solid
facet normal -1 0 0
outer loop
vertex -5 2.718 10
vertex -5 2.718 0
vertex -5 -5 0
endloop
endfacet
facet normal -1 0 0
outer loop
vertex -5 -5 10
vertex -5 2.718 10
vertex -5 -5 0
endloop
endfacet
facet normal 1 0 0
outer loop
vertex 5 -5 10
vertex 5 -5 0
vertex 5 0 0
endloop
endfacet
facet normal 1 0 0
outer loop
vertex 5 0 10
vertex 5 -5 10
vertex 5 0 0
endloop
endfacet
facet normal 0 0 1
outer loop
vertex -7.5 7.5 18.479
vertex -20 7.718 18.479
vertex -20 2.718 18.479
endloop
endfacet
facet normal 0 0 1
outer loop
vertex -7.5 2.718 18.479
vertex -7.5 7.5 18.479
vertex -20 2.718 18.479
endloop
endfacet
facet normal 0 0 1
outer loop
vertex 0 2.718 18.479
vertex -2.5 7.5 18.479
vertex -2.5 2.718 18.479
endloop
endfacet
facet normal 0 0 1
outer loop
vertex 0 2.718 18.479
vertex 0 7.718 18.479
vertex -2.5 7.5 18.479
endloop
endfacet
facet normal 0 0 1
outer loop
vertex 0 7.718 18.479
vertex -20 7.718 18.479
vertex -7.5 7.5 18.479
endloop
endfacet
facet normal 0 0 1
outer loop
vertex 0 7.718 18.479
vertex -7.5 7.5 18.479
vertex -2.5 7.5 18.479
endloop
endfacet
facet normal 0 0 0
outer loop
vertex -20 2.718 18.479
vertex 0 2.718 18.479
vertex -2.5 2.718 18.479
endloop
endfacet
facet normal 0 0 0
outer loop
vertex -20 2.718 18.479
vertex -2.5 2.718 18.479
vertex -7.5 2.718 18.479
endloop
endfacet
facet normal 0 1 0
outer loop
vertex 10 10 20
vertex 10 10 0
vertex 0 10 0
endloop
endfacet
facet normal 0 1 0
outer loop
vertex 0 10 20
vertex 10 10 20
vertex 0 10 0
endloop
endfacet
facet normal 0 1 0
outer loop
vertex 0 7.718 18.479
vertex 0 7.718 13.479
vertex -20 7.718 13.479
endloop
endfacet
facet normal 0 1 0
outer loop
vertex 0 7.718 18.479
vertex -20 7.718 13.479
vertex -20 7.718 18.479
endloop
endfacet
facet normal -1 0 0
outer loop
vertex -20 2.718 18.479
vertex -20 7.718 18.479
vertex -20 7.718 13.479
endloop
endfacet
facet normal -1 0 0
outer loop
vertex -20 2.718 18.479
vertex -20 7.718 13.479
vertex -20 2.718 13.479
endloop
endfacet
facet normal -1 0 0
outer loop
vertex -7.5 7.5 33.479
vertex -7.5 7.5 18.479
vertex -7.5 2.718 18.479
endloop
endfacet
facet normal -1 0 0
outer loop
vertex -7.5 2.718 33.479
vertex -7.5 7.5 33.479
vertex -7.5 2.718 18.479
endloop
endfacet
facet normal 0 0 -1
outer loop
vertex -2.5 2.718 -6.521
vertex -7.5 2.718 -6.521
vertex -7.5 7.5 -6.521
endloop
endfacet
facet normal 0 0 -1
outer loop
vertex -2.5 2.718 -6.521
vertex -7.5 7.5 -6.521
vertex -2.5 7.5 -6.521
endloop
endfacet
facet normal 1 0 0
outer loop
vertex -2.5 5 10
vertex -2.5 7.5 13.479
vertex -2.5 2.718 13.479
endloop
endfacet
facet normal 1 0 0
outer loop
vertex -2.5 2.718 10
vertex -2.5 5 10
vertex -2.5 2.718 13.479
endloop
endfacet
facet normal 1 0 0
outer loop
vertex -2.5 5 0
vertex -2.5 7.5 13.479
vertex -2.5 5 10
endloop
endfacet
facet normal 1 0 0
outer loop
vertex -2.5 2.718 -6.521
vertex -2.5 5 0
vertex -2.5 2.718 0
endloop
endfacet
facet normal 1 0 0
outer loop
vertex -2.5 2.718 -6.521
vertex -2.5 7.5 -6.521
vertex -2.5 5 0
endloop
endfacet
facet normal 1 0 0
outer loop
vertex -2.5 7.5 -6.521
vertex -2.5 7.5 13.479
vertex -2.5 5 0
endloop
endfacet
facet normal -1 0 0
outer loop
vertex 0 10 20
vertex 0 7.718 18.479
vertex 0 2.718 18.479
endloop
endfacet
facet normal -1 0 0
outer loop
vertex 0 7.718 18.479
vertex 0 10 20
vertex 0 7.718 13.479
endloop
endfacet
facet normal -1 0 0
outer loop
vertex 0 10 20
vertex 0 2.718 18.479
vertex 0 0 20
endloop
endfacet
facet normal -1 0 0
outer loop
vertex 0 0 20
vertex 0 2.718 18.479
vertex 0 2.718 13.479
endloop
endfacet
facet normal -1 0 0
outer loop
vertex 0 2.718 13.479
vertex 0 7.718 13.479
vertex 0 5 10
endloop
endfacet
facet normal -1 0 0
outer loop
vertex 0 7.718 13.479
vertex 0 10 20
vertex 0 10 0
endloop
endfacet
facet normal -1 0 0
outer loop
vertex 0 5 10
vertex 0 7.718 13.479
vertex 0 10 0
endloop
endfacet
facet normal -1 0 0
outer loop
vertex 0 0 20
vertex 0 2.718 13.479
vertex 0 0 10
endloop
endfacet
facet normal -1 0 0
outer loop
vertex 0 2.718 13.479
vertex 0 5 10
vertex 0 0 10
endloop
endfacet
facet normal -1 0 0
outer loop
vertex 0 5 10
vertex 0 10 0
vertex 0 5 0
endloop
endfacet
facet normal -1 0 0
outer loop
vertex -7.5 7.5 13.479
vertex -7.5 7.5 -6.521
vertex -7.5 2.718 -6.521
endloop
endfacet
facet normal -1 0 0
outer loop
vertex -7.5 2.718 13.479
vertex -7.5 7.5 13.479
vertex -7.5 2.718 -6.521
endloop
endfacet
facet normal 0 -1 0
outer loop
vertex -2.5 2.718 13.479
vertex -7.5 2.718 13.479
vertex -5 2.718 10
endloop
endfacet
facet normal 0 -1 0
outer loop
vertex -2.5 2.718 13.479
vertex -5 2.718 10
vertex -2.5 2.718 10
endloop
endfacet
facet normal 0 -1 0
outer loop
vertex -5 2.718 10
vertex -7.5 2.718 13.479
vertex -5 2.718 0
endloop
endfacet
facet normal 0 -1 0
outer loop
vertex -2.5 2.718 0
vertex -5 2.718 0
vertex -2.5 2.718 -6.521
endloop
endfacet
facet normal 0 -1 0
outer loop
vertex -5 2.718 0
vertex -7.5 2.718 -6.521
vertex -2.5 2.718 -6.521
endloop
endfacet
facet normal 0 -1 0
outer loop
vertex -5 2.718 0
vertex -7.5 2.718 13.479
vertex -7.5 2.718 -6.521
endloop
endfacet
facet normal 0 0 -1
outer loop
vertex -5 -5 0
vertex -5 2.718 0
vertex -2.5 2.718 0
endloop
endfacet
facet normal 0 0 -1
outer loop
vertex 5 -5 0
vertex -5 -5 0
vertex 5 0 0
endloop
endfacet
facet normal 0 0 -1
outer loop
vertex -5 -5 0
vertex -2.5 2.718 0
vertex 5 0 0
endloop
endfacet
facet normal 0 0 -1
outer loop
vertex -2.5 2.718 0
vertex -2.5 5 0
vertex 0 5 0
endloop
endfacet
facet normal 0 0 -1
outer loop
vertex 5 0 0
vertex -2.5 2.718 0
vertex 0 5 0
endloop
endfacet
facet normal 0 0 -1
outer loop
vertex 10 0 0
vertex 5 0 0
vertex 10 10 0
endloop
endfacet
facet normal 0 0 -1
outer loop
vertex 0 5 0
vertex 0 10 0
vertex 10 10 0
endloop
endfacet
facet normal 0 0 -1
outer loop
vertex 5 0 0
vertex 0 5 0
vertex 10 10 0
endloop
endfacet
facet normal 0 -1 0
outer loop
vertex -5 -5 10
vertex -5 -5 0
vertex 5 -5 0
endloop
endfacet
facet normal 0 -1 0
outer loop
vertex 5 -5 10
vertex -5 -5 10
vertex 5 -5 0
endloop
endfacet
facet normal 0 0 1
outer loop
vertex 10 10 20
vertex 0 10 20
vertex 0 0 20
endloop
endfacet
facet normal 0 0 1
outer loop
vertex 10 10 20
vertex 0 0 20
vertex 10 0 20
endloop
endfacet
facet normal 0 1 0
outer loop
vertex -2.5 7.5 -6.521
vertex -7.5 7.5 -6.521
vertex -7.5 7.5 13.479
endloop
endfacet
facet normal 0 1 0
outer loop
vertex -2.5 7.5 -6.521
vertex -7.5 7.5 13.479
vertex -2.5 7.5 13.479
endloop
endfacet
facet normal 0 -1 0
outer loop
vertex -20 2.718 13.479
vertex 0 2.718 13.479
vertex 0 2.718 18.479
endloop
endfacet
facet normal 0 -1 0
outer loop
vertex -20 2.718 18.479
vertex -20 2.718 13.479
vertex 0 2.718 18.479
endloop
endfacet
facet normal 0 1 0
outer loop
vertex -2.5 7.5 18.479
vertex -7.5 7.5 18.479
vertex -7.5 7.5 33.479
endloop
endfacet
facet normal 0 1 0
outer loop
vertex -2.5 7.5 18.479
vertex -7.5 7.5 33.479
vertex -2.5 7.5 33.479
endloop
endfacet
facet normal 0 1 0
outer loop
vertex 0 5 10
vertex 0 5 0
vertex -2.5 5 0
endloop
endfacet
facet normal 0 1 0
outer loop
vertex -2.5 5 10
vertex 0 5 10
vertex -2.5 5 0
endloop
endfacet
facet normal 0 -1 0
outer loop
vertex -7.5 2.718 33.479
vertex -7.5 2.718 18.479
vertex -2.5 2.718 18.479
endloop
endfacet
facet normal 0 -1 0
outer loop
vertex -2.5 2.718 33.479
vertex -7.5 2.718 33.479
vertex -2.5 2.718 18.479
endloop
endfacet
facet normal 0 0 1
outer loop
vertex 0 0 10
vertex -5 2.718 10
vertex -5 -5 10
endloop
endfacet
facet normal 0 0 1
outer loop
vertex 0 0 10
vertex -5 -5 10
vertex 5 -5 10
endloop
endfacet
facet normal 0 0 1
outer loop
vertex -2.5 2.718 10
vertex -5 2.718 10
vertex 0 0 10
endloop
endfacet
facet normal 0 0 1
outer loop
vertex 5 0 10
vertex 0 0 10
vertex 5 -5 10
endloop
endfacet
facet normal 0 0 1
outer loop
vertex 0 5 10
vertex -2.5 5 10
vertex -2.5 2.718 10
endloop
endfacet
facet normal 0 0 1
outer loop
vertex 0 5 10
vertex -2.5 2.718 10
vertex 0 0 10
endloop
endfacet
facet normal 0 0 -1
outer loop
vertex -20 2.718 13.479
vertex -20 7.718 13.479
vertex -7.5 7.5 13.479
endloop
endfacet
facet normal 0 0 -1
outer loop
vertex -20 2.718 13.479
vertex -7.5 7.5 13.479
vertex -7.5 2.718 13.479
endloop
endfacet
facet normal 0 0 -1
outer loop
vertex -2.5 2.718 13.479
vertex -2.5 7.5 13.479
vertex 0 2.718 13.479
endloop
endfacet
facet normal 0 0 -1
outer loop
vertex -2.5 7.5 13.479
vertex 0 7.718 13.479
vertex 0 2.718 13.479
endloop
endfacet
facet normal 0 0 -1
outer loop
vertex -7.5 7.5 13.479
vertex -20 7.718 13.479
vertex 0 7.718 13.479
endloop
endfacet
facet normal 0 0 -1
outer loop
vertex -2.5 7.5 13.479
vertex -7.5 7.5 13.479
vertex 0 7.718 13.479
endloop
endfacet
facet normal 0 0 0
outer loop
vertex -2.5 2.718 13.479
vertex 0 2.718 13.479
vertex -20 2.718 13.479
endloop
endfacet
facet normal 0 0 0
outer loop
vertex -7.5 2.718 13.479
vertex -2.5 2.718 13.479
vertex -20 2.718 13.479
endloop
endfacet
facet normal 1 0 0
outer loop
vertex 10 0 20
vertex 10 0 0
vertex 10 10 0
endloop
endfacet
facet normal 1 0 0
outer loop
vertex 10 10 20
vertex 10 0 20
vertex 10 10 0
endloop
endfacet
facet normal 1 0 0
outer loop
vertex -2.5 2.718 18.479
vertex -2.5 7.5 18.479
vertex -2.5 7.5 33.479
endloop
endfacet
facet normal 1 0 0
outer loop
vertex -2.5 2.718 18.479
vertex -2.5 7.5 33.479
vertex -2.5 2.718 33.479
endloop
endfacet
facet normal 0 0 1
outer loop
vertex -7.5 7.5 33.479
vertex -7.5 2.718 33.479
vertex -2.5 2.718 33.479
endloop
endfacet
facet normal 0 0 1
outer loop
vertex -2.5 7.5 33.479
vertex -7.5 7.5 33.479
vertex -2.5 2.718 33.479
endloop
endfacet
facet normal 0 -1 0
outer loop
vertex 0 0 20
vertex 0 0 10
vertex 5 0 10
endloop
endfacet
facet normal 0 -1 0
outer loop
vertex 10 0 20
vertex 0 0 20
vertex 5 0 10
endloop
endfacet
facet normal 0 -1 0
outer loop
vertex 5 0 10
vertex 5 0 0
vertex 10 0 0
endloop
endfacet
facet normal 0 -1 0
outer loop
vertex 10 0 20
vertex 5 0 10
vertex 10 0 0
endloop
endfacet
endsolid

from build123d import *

# Parameters (mm, degrees)
F0_W     = 5
F0_H     = 5
F1_DEPTH = 10
F2_DEPTH = 20
F3_W     = 5
F3_H     = 5
F4_DEPTH = 20
F5_W     = 5
F5_H     = 4.782355
F6_DEPTH = 20


with BuildPart() as f1:
    # F0 (on Top) → F1 (new body)
    with BuildSketch(Plane.XY):
        Polygon((-5, -5), (5, -5), (5, 0), (0, 0), (0, 5), (-5, 5), align=None)
        with Locations((2.5, 2.5)):
            Rectangle(F0_W, F0_H)
    extrude(amount=F1_DEPTH)

    # F0 (on Top) → F2 (join)
    with BuildSketch(Plane.XY):
        Polygon((5, 5), (5, 0), (10, 0), (10, 10), (0, 10), (0, 5), align=None)
        with Locations((2.5, 2.5)):
            Rectangle(F0_W, F0_H)
    extrude(amount=F2_DEPTH)



with BuildPart() as f4:
    # F3 (on face) → F4 (new body)
    with BuildSketch(Plane(origin=(0, 0, 0), x_dir=(0, -1, 0), z_dir=(-1, 0, 0))):
        with Locations((-5.217645, 15.978696)):
            Rectangle(F3_W, F3_H)
    extrude(amount=F4_DEPTH)


with BuildPart() as f1_1:
    add(f1.part)

    add(f4.part)  # F6 merges F4
    # F5 (on face) → F6 (join, symmetric)
    with BuildSketch(Plane(origin=(0, 0, 13.478696), x_dir=(1, 0, 0), z_dir=(0, 0, -1))):
        with Locations((-5, -5.108823)):
            Rectangle(F5_W, F5_H)
    extrude(amount=F6_DEPTH, both=True)


solid = f1_1.part
